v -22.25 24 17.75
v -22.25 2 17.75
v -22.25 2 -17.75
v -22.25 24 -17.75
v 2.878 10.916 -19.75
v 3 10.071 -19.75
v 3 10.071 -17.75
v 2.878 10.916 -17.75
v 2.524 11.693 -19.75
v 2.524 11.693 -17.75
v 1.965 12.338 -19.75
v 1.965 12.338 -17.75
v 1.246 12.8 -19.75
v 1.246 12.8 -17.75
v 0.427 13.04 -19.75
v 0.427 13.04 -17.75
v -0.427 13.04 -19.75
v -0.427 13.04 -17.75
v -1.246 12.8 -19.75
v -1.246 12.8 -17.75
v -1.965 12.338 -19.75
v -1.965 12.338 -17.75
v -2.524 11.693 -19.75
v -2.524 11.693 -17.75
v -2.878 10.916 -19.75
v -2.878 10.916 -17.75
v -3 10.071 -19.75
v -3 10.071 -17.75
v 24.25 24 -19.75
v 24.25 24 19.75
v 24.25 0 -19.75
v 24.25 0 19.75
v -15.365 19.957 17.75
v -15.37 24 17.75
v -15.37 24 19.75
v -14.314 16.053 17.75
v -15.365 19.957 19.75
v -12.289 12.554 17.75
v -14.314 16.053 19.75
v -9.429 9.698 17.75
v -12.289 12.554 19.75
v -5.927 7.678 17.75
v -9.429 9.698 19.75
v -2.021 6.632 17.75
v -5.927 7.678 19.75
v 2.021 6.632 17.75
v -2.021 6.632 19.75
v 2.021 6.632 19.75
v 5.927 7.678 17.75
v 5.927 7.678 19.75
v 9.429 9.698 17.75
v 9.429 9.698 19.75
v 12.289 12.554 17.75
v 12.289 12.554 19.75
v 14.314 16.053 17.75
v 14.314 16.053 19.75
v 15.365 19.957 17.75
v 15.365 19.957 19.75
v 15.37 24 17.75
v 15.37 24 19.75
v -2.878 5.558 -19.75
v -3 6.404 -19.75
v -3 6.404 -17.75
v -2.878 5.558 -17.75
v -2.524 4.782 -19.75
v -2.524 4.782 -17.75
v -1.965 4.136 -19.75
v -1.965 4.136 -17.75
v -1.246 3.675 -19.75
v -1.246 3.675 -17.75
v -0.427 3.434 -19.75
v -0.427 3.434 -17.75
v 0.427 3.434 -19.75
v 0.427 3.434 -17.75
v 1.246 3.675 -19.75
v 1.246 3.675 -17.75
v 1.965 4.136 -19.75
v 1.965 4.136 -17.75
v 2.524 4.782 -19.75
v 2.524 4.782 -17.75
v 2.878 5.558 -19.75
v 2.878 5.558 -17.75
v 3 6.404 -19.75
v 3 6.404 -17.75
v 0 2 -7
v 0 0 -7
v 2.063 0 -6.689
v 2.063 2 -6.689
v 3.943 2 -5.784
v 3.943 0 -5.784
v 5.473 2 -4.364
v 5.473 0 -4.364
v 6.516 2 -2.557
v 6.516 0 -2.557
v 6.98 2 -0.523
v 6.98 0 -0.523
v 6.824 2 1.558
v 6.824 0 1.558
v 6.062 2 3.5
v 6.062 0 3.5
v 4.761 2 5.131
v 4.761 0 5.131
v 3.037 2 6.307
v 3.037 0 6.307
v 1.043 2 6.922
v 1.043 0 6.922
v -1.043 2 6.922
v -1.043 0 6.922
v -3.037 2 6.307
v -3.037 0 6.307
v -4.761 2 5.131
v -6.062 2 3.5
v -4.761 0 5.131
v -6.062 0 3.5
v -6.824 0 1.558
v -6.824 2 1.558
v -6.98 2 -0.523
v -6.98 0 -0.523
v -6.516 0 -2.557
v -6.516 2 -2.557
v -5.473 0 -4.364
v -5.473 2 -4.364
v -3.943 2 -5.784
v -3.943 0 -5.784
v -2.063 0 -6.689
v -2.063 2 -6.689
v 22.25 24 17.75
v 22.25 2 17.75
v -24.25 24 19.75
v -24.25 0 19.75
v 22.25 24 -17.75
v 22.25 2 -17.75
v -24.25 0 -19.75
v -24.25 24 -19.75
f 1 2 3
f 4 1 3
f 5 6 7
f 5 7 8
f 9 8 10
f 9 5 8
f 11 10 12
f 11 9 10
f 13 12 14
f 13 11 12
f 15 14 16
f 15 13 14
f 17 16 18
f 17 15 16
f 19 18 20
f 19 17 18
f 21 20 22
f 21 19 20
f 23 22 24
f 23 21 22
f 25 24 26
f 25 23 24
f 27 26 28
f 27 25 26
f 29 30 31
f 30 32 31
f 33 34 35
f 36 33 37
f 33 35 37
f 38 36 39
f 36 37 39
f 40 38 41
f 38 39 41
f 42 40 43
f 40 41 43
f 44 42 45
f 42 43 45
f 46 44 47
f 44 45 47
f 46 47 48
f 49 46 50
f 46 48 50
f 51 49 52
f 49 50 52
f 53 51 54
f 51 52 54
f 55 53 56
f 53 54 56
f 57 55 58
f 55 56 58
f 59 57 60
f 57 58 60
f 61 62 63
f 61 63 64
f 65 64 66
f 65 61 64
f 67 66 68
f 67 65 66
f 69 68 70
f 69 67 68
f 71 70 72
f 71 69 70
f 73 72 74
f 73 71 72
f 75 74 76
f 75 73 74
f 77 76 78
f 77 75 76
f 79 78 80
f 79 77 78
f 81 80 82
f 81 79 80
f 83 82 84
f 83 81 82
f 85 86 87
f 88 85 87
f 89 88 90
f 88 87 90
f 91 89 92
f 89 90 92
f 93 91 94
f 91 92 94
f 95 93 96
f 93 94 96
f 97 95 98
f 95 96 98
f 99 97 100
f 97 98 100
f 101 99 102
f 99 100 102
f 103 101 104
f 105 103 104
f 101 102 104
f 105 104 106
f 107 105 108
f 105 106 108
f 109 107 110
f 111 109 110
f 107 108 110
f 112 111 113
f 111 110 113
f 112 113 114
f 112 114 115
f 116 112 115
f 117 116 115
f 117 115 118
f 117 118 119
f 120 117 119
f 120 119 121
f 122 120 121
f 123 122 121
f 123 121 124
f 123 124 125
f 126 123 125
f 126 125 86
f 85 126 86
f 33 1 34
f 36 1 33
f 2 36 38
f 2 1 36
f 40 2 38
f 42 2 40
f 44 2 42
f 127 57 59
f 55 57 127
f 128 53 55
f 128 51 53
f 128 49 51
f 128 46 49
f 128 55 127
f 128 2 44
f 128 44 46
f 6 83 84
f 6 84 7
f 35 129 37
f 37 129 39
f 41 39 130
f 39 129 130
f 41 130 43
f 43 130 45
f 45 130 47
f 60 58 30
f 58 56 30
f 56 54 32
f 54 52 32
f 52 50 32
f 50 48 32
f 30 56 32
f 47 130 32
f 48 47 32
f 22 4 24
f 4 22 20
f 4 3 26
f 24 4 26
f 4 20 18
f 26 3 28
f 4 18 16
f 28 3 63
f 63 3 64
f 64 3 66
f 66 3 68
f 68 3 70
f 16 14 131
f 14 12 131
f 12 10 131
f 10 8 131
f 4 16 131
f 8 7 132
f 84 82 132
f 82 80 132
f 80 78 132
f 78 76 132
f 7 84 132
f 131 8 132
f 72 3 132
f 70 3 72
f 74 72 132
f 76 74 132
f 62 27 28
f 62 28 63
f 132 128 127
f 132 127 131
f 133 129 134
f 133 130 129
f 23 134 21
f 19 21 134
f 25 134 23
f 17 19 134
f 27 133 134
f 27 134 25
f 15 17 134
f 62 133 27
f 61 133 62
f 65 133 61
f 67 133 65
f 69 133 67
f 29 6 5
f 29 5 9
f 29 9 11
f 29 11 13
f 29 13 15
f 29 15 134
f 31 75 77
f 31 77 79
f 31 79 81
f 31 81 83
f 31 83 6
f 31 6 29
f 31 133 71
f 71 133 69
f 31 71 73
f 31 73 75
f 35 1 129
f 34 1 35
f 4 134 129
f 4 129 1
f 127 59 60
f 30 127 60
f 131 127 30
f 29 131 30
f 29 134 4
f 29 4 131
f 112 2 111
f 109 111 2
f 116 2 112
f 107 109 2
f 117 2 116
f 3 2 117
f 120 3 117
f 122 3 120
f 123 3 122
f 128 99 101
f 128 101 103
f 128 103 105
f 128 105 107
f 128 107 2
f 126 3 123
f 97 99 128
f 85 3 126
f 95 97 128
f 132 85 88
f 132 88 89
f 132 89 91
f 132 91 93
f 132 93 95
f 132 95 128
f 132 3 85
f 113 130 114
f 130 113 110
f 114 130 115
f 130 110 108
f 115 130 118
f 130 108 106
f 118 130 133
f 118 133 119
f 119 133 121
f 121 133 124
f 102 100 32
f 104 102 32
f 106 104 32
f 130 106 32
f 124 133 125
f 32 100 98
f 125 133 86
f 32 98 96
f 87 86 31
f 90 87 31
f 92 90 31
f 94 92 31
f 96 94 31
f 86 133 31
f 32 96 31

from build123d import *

# Parameters (mm, degrees)
SKETCH_2_W          = 48.5
SKETCH_2_H          = 39.5
EXTRUDE_1_DEPTH     = 2
SKETCH_4_W          = 48.5
SKETCH_4_H          = 39.5
SKETCH_4_W_2        = 44.5
SKETCH_4_H_2        = 35.5
EXTRUDE_2_DEPTH     = 22
SKETCH_5_R          = 15.5
CUT_EXTRUDE_1_DEPTH = 10
CUT_EXTRUDE_2_DEPTH = 10
SKETCH_7_R          = 7
CUT_EXTRUDE_3_DEPTH = 10


with BuildPart() as part:
    # 草图2 → 凸台-拉伸1 (new body)
    with BuildSketch(Plane(origin=(0, 0, 0), x_dir=(1, 0, 0), z_dir=(0, 1, 0))):
        Rectangle(SKETCH_2_W, SKETCH_2_H)
    extrude(amount=EXTRUDE_1_DEPTH)

    # 草图4 → 凸台-拉伸2 (add)
    with BuildSketch(Plane(origin=(0, 2, 0), x_dir=(1, 0, 0), z_dir=(0, 1, 0))):
        Rectangle(SKETCH_4_W, SKETCH_4_H)
        Rectangle(SKETCH_4_W_2, SKETCH_4_H_2, mode=Mode.SUBTRACT)
    extrude(amount=EXTRUDE_2_DEPTH)

    # 草图5 → 切除-拉伸1 (cut)
    with BuildSketch(Plane.XY.offset(19.75)):
        with Locations((0, 22)):
            Circle(SKETCH_5_R)
    extrude(amount=-CUT_EXTRUDE_1_DEPTH, mode=Mode.SUBTRACT)

    # 草图6 → 切除-拉伸2 (cut)
    with BuildSketch(Plane(origin=(0, 0, -19.75), x_dir=(-1, 0, 0), z_dir=(0, 0, -1))):
        with BuildLine():
            Line((3, 10.070876888), (3, 6.403632954))
            ThreePointArc((3, 6.403632954), (0, 3.403632954), (-3, 6.403632954))
            Line((-3, 6.403632954), (-3, 10.070876888))
            ThreePointArc((-3, 10.070876888), (0, 13.070876888), (3, 10.070876888))
        make_face()
    extrude(amount=-CUT_EXTRUDE_2_DEPTH, mode=Mode.SUBTRACT)

    # 草图7 → 切除-拉伸3 (cut)
    with BuildSketch(Plane.XZ):
        with Locations(Location((0, 0, 0), (0, 0, 270))):
            Circle(SKETCH_7_R)
    extrude(amount=-CUT_EXTRUDE_3_DEPTH, mode=Mode.SUBTRACT)


solid = part.part
